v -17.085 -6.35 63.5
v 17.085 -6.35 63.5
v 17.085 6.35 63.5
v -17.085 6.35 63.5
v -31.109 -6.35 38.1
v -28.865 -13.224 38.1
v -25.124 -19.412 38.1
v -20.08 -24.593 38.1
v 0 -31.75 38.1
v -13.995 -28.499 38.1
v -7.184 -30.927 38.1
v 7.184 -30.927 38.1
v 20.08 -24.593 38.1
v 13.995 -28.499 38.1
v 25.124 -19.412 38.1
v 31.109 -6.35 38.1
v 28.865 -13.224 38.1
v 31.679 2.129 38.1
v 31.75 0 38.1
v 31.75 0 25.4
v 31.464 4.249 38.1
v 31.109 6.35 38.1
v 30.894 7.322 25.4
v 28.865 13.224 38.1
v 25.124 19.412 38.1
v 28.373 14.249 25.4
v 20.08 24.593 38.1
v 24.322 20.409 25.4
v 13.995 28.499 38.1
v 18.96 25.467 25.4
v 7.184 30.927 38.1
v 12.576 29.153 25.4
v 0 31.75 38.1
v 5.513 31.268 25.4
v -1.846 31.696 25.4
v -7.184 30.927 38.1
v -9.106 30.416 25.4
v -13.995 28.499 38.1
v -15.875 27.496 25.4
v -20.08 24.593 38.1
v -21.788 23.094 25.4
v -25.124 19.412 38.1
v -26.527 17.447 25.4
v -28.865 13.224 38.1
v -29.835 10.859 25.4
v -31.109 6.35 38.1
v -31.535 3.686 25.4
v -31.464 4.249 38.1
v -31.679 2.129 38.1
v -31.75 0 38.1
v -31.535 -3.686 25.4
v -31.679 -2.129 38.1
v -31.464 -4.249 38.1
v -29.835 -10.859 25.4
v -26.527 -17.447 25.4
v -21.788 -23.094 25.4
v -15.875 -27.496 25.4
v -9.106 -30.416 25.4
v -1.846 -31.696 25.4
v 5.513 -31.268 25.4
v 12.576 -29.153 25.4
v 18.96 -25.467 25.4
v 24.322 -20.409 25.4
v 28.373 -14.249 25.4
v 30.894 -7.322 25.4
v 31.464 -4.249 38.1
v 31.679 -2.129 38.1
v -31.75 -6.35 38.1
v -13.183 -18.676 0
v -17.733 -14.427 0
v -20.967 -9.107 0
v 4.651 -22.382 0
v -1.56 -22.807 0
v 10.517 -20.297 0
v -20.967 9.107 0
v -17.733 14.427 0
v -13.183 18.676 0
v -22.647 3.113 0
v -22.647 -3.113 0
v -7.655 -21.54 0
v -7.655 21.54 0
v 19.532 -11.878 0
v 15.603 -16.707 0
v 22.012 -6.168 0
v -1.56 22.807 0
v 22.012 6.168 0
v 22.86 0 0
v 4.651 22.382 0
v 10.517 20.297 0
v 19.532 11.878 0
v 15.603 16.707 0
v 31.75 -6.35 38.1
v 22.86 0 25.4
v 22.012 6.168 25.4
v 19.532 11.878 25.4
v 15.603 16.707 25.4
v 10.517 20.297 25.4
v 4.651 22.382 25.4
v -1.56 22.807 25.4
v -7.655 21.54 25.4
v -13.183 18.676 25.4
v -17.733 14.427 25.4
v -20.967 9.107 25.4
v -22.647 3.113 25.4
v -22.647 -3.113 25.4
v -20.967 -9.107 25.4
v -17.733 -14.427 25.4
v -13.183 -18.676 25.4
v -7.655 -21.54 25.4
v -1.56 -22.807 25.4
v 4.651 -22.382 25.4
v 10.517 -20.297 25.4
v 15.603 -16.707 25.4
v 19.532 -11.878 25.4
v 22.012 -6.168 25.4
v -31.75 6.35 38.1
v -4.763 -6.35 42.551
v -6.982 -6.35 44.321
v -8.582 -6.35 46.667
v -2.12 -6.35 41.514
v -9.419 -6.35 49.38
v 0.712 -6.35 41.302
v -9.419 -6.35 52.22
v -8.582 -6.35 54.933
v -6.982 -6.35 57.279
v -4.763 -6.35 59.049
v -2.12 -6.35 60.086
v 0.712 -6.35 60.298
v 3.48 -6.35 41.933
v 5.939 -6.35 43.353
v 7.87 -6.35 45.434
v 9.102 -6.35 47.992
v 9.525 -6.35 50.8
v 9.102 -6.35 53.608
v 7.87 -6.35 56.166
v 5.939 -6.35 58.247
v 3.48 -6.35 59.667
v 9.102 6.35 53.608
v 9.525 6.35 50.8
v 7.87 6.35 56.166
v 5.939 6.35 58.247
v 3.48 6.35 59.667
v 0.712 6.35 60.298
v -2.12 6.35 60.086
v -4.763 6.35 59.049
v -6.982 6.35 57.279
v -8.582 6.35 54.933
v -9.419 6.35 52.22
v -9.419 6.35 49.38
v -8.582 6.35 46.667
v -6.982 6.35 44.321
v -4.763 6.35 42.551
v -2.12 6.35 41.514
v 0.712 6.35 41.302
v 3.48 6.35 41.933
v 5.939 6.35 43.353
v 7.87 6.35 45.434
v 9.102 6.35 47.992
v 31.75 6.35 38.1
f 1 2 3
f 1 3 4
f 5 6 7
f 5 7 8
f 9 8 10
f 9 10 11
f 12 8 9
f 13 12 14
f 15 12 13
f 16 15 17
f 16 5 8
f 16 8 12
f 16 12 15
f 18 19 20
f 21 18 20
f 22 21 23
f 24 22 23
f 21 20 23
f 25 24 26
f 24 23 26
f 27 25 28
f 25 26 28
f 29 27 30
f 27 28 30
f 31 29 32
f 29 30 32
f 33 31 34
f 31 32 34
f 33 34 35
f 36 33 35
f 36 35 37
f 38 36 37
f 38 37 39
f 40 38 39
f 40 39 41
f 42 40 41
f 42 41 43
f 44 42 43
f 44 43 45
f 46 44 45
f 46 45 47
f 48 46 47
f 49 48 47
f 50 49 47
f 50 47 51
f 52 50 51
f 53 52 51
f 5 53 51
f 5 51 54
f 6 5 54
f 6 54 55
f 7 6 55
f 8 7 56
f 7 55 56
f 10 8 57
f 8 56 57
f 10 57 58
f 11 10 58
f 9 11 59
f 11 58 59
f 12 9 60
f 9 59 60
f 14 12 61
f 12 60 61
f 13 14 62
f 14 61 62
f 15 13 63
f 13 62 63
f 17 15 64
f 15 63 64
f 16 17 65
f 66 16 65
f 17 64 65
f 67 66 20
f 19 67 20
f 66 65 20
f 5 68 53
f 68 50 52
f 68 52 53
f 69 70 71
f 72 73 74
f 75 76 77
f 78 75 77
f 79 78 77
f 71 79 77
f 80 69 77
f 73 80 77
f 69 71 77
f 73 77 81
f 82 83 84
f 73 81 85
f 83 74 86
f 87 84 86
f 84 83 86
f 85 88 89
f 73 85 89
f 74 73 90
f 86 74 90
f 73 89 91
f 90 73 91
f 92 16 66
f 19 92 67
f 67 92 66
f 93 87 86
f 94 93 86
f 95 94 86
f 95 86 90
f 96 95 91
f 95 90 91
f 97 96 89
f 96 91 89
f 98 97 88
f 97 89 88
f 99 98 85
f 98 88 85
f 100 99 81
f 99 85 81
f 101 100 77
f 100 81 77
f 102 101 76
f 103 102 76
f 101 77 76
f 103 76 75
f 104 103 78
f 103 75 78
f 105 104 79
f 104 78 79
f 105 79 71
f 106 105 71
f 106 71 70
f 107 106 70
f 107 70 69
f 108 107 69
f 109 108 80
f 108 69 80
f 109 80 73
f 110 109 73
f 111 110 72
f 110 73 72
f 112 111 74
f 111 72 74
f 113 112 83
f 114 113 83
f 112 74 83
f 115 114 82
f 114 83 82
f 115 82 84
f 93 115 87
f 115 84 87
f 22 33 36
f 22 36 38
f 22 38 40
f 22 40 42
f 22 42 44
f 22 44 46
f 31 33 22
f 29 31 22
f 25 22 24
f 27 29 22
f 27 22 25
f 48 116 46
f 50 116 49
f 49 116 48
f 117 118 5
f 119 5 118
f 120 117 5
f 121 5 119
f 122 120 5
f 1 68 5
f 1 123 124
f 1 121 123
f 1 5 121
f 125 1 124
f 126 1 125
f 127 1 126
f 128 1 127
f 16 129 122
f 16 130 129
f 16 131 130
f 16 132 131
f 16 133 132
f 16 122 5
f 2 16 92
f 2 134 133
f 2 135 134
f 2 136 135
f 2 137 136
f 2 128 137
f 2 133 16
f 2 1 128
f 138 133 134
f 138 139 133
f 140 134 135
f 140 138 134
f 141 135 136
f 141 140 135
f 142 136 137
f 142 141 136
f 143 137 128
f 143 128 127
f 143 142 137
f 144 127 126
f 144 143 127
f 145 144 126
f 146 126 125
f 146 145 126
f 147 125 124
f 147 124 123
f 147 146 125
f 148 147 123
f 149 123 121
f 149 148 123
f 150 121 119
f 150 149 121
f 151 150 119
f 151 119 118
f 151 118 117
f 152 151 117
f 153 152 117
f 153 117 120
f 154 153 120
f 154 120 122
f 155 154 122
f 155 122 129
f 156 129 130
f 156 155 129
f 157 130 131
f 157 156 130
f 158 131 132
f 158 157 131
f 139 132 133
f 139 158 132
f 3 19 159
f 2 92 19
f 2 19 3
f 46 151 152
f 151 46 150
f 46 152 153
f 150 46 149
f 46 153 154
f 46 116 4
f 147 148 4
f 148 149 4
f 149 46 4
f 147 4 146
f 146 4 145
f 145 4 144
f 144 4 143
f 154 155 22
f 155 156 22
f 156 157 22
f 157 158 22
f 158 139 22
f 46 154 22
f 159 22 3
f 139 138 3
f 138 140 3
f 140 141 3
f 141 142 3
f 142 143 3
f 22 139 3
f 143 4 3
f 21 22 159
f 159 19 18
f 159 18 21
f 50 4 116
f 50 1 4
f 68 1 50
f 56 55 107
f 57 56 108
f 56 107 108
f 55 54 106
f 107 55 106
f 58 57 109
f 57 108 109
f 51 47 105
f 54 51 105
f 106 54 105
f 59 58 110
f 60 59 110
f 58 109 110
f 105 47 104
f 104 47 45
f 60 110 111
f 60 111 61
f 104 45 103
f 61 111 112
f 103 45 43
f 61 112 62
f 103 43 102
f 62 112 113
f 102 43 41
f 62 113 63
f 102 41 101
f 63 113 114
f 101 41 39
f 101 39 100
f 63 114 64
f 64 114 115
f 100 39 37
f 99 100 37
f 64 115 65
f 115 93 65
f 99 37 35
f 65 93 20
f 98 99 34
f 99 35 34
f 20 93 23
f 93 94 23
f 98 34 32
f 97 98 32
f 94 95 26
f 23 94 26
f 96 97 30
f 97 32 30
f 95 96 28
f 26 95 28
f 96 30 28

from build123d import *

# Parameters (mm, degrees)
F0_R     = 22.86
F1_DEPTH = 25.4
F2_R     = 31.75
F3_DEPTH = 12.7
F4_R     = 9.525
F5_DEPTH = 6.35


with BuildPart() as f1:
    # F0 (on Top) → F1 (new body)
    with BuildSketch(Plane.XY):
        Circle(F0_R)
    extrude(amount=F1_DEPTH)

    # F2 (on face) → F3 (join)
    with BuildSketch(Plane.XY.offset(25.4)):
        Circle(F2_R)
    extrude(amount=F3_DEPTH)

    # F4 (on Front) → F5 (join, symmetric)
    with BuildSketch(Plane.XZ):
        Polygon((-31.75, 38.1), (0, 38.1), (31.75, 38.1), (17.085303, 63.5), (0, 63.5), (-17.085303, 63.5), align=None)
        with Locations((0, 50.8)):
            Circle(F4_R, mode=Mode.SUBTRACT)
    extrude(amount=F5_DEPTH, both=True)


solid = f1.part
